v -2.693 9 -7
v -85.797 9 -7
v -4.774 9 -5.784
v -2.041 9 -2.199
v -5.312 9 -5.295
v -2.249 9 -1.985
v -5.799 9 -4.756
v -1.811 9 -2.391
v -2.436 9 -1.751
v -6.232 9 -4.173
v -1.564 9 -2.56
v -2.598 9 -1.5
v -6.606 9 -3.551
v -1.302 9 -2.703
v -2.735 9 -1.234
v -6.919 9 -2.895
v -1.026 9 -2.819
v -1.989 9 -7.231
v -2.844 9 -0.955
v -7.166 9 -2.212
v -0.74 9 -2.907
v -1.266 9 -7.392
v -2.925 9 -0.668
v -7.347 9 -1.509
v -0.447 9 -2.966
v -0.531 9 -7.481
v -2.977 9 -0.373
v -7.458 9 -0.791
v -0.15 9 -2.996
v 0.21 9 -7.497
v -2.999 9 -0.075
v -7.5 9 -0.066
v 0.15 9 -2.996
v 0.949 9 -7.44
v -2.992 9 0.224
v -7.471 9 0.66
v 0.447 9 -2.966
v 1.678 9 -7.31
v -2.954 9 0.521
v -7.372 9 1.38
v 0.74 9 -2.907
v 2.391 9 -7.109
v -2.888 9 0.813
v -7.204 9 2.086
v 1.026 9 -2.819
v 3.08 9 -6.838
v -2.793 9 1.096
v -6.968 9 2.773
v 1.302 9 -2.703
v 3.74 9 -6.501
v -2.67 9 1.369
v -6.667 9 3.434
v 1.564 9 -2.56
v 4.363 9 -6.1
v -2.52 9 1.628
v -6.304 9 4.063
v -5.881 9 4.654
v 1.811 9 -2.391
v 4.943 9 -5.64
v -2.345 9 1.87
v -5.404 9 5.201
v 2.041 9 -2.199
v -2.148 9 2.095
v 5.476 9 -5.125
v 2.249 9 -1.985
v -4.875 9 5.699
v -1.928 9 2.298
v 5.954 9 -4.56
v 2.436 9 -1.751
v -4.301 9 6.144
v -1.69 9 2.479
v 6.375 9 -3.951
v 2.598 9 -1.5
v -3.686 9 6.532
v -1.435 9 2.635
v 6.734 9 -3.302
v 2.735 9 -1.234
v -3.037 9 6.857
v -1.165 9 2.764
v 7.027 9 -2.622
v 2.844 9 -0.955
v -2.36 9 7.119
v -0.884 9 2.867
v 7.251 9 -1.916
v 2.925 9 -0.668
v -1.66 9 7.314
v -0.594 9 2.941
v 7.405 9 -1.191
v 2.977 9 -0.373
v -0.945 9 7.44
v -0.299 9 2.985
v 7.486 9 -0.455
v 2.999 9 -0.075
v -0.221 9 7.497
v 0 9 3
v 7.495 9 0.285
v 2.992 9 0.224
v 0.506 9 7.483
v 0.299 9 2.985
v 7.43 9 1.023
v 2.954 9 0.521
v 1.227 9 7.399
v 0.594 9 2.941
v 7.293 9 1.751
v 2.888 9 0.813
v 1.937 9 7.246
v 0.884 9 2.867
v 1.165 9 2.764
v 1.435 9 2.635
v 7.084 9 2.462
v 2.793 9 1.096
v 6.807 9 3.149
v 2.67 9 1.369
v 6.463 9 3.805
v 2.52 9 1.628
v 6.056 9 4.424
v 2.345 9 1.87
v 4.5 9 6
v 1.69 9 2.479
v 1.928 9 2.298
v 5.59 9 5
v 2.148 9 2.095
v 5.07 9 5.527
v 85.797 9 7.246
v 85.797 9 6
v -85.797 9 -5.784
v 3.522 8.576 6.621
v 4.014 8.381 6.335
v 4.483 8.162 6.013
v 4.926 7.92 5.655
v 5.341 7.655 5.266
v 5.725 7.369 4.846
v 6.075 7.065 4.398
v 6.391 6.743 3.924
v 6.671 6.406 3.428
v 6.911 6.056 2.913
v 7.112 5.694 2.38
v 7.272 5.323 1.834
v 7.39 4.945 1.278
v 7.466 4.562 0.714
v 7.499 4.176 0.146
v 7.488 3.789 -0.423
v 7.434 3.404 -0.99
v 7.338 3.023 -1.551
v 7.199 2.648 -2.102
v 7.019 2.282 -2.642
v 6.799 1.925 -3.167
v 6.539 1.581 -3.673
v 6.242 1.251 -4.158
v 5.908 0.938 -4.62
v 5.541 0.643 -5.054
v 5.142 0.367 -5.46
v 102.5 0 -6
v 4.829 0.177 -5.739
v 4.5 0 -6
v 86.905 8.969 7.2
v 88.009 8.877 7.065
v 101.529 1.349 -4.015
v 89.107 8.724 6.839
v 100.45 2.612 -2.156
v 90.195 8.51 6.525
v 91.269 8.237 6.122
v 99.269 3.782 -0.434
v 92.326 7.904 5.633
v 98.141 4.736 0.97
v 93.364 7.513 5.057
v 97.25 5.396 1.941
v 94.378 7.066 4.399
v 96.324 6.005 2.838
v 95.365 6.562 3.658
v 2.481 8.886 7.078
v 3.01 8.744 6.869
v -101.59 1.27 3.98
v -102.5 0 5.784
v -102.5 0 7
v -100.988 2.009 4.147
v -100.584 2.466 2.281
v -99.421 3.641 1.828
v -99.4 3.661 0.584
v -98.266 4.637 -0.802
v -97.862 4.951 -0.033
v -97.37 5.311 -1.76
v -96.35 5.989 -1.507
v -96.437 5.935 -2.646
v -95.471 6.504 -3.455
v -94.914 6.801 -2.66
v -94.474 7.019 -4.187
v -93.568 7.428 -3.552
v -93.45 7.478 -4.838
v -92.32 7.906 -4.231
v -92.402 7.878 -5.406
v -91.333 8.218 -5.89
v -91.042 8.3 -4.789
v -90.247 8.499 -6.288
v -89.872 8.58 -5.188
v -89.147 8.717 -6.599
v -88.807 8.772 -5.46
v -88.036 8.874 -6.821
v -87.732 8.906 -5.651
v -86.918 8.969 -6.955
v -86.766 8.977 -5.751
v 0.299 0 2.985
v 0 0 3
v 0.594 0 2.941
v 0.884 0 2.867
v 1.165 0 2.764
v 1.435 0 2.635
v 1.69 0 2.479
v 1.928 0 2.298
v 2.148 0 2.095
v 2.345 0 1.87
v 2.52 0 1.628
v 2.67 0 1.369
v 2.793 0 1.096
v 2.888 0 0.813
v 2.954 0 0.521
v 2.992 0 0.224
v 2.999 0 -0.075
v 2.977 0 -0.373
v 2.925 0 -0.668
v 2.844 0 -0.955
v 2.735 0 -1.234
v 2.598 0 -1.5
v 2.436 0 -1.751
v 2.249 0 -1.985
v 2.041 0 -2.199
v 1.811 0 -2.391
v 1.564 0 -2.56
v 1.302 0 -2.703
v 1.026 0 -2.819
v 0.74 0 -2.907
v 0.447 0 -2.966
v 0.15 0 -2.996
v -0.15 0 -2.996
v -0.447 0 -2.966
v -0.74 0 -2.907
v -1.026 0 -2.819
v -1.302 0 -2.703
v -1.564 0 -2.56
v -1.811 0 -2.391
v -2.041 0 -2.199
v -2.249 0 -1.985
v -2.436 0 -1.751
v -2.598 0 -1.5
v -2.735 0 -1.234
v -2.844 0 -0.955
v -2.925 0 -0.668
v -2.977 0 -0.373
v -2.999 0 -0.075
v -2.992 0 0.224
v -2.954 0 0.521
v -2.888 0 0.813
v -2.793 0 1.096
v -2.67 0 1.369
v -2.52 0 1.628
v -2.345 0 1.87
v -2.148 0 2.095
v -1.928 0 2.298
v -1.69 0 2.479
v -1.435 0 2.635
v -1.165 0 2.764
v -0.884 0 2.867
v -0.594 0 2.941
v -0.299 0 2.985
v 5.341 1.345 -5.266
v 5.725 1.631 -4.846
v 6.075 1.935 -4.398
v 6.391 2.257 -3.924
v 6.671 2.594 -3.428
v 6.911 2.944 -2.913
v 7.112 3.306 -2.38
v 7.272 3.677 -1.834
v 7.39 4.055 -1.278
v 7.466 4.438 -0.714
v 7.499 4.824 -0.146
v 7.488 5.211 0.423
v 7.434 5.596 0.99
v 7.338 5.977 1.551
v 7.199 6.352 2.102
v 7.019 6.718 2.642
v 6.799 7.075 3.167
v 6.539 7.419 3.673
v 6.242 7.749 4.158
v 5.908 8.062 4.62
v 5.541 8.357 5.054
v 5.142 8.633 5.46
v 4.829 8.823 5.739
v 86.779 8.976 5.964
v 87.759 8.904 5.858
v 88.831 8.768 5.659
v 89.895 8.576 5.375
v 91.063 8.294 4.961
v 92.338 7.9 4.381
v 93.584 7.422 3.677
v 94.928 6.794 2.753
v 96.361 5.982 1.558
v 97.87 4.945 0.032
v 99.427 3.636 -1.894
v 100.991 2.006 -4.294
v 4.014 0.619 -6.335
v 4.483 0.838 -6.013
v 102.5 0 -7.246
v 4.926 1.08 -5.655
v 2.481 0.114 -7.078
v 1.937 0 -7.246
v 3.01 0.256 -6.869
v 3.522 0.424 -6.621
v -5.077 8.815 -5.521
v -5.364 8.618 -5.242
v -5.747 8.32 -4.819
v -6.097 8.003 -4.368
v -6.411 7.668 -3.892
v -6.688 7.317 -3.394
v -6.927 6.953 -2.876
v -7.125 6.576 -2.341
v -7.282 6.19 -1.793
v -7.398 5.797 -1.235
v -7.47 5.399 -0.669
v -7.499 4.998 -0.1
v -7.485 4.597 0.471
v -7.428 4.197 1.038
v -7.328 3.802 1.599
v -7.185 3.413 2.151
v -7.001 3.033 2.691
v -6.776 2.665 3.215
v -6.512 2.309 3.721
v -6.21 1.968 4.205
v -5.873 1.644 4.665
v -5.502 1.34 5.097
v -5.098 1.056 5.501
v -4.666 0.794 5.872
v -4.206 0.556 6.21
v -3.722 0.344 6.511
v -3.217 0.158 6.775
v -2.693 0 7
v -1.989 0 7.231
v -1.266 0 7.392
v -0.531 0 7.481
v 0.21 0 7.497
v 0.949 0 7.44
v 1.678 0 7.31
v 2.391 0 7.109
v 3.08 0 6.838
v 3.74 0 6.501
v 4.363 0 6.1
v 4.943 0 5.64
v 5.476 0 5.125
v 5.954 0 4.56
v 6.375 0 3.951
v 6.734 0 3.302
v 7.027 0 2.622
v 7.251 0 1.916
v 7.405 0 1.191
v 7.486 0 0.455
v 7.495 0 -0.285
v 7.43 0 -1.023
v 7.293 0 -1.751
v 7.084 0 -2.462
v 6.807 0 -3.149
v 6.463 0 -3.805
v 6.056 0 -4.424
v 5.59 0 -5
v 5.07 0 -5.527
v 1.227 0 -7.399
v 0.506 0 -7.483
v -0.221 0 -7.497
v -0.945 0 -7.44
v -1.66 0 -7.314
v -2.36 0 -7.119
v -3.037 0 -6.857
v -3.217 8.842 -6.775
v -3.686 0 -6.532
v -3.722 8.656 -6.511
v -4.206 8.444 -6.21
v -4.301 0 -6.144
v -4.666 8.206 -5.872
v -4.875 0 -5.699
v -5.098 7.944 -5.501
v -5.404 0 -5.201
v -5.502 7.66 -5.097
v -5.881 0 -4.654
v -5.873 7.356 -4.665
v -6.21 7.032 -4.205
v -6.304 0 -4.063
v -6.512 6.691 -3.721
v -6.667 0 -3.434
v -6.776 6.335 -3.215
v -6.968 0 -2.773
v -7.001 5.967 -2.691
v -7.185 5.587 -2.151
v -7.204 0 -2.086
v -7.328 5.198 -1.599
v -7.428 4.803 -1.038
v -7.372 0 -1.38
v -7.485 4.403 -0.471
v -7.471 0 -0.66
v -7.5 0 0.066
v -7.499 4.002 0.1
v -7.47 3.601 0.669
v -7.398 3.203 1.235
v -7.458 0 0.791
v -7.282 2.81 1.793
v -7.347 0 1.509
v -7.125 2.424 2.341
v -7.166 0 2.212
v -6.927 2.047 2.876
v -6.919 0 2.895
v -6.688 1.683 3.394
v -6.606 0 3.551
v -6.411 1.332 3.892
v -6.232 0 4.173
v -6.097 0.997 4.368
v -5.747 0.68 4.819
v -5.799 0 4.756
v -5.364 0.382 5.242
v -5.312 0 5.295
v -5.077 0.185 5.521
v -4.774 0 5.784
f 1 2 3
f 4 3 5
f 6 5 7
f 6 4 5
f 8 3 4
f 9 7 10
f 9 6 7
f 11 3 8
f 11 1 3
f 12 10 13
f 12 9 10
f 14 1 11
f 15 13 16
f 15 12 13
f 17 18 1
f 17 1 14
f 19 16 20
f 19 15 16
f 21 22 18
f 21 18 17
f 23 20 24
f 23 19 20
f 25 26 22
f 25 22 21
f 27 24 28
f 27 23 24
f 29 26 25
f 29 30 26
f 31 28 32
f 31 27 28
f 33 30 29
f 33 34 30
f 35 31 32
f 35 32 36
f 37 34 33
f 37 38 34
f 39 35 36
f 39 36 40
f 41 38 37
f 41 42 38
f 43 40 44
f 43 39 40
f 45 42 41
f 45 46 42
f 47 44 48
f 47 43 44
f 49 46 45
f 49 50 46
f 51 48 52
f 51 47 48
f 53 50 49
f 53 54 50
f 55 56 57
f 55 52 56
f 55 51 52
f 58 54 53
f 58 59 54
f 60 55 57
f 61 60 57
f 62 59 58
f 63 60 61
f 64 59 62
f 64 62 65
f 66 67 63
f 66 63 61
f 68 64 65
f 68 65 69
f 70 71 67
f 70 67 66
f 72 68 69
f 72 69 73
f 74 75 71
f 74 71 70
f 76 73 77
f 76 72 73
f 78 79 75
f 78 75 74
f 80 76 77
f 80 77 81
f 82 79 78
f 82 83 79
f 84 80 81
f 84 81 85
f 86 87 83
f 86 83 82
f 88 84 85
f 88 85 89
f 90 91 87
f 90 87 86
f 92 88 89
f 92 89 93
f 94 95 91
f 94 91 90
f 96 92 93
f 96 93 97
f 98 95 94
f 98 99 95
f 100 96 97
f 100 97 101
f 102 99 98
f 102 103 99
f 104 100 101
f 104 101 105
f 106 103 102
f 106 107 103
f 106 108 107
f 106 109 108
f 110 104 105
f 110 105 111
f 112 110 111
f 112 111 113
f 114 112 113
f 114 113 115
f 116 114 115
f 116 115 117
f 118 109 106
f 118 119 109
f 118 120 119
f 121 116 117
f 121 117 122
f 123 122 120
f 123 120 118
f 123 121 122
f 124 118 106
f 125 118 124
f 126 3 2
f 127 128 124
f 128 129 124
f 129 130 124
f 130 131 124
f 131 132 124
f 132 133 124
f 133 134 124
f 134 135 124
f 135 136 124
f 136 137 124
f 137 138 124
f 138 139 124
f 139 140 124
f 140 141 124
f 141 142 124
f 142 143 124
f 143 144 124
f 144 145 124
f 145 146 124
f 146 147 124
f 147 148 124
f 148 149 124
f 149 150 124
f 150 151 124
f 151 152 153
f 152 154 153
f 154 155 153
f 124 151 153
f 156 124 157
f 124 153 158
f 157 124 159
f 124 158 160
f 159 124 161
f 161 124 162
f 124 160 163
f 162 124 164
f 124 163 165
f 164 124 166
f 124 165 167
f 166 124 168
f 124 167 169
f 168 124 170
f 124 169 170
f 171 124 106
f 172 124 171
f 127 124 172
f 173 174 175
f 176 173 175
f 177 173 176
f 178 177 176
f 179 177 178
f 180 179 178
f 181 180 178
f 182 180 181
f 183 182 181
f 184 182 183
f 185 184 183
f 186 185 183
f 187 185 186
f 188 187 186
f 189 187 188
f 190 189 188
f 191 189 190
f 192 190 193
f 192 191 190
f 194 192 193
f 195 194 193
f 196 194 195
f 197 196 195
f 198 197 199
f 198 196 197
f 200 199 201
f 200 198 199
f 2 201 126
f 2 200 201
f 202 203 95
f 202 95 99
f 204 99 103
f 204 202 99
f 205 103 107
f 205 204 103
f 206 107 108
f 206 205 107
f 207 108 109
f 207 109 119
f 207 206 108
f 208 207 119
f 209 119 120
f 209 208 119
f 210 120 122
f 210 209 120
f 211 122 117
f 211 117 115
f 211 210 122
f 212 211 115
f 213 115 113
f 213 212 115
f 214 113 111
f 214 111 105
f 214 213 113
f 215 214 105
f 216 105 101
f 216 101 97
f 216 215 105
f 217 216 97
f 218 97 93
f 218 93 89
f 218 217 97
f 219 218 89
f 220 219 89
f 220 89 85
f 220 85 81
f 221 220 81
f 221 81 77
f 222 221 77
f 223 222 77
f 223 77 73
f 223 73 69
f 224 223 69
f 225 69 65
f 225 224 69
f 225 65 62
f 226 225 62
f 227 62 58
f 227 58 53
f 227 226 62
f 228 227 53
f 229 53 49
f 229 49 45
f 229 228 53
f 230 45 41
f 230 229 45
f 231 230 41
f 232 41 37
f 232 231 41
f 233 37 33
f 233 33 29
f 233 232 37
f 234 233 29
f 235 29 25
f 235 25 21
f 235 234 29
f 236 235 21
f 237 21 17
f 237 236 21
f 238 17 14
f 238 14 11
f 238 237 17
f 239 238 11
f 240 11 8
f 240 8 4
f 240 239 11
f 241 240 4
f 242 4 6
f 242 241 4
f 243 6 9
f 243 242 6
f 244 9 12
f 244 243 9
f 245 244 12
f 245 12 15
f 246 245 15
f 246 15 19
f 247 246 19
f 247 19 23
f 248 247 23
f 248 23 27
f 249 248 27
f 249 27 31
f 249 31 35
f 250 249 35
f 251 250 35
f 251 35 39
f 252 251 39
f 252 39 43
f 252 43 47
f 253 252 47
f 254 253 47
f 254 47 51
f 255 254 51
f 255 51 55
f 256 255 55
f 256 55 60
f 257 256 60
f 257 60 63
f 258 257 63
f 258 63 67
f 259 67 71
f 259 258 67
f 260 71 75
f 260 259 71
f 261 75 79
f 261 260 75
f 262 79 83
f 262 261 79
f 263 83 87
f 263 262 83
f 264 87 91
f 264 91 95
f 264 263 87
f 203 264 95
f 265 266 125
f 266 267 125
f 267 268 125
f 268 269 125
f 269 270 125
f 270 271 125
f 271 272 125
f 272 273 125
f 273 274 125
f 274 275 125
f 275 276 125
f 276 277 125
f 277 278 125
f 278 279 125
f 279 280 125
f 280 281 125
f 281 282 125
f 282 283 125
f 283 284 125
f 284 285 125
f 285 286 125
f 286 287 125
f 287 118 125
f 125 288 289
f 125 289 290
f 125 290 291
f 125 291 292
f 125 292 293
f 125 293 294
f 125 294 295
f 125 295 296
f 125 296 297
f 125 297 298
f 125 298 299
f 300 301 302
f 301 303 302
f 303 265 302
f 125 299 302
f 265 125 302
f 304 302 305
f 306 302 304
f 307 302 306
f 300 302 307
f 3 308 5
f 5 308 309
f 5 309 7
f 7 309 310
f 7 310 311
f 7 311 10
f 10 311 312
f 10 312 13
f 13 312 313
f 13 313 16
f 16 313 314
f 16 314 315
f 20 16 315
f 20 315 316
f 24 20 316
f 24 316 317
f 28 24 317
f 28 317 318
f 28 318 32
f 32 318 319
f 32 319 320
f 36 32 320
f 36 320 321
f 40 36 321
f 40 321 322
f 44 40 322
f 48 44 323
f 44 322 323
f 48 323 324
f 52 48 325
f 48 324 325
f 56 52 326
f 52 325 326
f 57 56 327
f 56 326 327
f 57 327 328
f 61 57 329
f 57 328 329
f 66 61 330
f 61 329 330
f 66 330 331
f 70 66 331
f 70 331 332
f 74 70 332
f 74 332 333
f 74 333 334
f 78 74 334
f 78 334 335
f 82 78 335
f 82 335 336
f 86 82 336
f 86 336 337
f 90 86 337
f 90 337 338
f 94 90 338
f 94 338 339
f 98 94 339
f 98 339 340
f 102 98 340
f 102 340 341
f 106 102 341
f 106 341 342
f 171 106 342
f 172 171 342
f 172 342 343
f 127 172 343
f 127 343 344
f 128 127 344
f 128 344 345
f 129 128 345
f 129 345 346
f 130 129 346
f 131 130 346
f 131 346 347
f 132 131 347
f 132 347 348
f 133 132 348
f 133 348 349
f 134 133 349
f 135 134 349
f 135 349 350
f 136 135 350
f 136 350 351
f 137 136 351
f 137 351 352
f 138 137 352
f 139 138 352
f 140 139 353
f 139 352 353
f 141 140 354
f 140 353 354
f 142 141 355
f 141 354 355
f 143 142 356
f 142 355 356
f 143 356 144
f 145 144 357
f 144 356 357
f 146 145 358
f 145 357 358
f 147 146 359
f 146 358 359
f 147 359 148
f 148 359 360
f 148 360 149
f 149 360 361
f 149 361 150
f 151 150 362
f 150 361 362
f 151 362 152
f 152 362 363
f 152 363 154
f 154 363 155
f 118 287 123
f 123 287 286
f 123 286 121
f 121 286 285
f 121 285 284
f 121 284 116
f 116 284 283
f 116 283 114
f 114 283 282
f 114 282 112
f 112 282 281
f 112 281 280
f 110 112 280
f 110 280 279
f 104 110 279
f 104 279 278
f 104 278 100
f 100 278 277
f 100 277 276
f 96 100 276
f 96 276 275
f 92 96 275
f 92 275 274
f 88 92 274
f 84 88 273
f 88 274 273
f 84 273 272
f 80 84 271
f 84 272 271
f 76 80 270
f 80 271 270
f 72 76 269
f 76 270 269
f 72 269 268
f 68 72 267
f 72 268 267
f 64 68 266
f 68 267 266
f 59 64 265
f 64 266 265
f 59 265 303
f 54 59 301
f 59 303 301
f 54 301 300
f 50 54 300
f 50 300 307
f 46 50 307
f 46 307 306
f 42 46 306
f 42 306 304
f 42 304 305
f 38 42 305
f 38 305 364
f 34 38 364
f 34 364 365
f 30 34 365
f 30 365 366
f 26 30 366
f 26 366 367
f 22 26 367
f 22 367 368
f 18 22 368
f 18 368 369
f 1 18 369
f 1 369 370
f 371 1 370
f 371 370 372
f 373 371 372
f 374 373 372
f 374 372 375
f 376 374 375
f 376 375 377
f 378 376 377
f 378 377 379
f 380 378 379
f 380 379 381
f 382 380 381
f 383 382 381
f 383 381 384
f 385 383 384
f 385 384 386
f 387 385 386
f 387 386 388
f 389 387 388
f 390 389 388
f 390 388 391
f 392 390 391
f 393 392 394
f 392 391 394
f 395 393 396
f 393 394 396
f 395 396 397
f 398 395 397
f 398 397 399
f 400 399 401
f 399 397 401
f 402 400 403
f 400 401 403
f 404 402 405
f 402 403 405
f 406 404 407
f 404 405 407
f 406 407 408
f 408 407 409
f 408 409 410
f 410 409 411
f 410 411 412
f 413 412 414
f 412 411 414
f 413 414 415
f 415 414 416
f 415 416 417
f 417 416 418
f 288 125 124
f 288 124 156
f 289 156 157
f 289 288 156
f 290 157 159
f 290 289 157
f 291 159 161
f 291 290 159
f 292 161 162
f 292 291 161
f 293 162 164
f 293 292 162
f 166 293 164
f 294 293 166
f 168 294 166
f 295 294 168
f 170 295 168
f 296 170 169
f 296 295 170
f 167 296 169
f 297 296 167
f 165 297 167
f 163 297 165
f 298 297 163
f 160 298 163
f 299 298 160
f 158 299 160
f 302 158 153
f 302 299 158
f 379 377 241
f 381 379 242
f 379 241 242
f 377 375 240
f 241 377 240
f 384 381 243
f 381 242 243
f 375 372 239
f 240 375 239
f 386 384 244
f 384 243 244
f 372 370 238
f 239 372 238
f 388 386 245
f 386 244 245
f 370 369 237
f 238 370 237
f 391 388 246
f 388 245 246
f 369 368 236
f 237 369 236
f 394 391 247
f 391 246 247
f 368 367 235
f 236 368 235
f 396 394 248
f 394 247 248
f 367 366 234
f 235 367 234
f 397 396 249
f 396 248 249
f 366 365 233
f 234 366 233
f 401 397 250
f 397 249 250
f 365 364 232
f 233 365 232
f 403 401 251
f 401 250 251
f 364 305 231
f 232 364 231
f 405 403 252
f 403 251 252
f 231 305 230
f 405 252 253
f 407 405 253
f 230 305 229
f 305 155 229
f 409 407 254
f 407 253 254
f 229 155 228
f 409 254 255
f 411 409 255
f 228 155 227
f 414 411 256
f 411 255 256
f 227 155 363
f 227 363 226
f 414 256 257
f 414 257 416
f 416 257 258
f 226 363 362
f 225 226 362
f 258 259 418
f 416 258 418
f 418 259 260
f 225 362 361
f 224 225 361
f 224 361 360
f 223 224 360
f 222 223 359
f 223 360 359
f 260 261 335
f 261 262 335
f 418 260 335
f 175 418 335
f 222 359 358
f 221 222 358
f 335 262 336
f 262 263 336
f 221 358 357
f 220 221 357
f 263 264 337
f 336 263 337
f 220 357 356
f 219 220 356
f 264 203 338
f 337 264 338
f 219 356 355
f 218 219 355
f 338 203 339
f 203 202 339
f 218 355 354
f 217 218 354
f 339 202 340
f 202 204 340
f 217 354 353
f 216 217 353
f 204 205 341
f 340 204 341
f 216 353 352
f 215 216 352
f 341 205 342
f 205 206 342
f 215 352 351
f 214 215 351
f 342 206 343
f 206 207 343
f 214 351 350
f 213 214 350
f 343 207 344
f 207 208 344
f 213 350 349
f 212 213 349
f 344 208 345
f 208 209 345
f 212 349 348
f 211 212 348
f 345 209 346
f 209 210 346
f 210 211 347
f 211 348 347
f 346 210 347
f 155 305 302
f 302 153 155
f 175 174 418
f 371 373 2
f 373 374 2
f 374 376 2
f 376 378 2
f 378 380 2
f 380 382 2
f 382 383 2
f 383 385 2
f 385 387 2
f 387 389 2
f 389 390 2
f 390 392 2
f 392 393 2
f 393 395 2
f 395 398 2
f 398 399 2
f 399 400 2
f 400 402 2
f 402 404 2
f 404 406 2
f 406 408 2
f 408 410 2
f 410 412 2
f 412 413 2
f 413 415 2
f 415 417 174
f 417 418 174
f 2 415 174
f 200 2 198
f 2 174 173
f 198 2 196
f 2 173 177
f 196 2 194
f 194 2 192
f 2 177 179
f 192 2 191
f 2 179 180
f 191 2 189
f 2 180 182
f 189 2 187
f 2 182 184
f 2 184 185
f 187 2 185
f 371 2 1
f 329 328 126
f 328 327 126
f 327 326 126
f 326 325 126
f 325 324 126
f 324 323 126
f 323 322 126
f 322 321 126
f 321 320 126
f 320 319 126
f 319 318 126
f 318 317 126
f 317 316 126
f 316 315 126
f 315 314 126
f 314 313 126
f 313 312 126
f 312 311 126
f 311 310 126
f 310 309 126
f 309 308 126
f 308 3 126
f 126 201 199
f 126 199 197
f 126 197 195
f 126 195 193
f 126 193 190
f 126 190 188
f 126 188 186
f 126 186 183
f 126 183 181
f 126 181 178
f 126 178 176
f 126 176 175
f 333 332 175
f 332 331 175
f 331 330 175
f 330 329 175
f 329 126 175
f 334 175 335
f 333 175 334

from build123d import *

# Parameters (mm, degrees)
SKETCH1_R                = 7.5
SKETCH1_R_2              = 3
BOSS_EXTRUDE1_DEPTH      = 9
BOSS_EXTRUDE2_REACH      = 112.622
BOSS_EXTRUDE2_END_RADIUS = 7.5
BOSS_EXTRUDE3_REACH      = 207.334
BOSS_EXTRUDE3_END_RADIUS = 7.5
FILLET1_START            = -7.245522841
FILLET1_DEPTH            = 14.745522841


with BuildPart() as part:
    # Sketch1 → Boss-Extrude1 (new body)
    with BuildSketch(Plane(origin=(0, 0, 0), x_dir=(1, 0, 0), z_dir=(0, 1, 0))):
        with Locations(Location((0, 0, 0), (0, 0, 270))):
            Circle(SKETCH1_R)
        with Locations(Location((0, 0, 0), (0, 0, 270))):
            Circle(SKETCH1_R_2, mode=Mode.SUBTRACT)
    extrude(amount=BOSS_EXTRUDE1_DEPTH)

    # Boss-Extrude2: up to this cylinder (the profile starts outside it)
    boss_extrude2_end = Plane(origin=(0, 4.5, 0), z_dir=(0, -1, 0)) * Cylinder(BOSS_EXTRUDE2_END_RADIUS, 241.244, mode=Mode.PRIVATE)
    # Sketch3 → Boss-Extrude2 (add, up to the surface)
    with BuildSketch(Plane(origin=(102.5, 0, 0), x_dir=(0, 0, -1), z_dir=(1, 0, 0)), mode=Mode.PRIVATE) as boss_extrude2_sk1:
        Polygon((-6, 9), (7.245522841, 0), (6, 0), (-7.245522841, 9), align=None)
    boss_extrude2_tool1 = extrude(boss_extrude2_sk1.sketch, amount=-BOSS_EXTRUDE2_REACH, mode=Mode.PRIVATE) - boss_extrude2_end
    add(boss_extrude2_tool1.solids().sort_by_distance((102.5, 4.5, 0))[0])

    # Boss-Extrude3: up to this cylinder (the profile starts outside it)
    boss_extrude3_end = Plane(origin=(0, 4.5, 0), z_dir=(0, -1, 0)) * Cylinder(BOSS_EXTRUDE3_END_RADIUS, 430.668, mode=Mode.PRIVATE)
    # Sketch5 → Boss-Extrude3 (add, up to the surface)
    with BuildSketch(Plane(origin=(-102.5, 0, 0), x_dir=(0, 0, -1), z_dir=(1, 0, 0)), mode=Mode.PRIVATE) as boss_extrude3_sk1:
        Polygon((5.784000547, 9), (-7, 0), (-5.784000547, 0), (7, 9), align=None)
    boss_extrude3_tool1 = extrude(boss_extrude3_sk1.sketch, amount=BOSS_EXTRUDE3_REACH, mode=Mode.PRIVATE) - boss_extrude3_end
    add(boss_extrude3_tool1.solids().sort_by_distance((-102.5, 4.5, 0))[0])

    # Fillet1: read off the stored shape, not the designer's step
    # Fillet1 outline → Fillet1 (cut)
    with BuildSketch(Plane.XY.offset(FILLET1_START)):
        with BuildLine():
            ThreePointArc((-102.5, 0), (-95.283539892, 6.606816862), (-85.796706912, 9))
            Line((-85.796706912, 9), (-102.5, 9))
            Line((-102.5, 9), (-102.5, 0))
        make_face()
        with BuildLine():
            ThreePointArc((85.796706911, 9), (95.283539892, 6.606816862), (102.5, 0))
            Line((102.5, 0), (102.5, 9))
            Line((102.5, 9), (85.796706911, 9))
        make_face()
    extrude(amount=FILLET1_DEPTH, mode=Mode.SUBTRACT)


solid = part.part
